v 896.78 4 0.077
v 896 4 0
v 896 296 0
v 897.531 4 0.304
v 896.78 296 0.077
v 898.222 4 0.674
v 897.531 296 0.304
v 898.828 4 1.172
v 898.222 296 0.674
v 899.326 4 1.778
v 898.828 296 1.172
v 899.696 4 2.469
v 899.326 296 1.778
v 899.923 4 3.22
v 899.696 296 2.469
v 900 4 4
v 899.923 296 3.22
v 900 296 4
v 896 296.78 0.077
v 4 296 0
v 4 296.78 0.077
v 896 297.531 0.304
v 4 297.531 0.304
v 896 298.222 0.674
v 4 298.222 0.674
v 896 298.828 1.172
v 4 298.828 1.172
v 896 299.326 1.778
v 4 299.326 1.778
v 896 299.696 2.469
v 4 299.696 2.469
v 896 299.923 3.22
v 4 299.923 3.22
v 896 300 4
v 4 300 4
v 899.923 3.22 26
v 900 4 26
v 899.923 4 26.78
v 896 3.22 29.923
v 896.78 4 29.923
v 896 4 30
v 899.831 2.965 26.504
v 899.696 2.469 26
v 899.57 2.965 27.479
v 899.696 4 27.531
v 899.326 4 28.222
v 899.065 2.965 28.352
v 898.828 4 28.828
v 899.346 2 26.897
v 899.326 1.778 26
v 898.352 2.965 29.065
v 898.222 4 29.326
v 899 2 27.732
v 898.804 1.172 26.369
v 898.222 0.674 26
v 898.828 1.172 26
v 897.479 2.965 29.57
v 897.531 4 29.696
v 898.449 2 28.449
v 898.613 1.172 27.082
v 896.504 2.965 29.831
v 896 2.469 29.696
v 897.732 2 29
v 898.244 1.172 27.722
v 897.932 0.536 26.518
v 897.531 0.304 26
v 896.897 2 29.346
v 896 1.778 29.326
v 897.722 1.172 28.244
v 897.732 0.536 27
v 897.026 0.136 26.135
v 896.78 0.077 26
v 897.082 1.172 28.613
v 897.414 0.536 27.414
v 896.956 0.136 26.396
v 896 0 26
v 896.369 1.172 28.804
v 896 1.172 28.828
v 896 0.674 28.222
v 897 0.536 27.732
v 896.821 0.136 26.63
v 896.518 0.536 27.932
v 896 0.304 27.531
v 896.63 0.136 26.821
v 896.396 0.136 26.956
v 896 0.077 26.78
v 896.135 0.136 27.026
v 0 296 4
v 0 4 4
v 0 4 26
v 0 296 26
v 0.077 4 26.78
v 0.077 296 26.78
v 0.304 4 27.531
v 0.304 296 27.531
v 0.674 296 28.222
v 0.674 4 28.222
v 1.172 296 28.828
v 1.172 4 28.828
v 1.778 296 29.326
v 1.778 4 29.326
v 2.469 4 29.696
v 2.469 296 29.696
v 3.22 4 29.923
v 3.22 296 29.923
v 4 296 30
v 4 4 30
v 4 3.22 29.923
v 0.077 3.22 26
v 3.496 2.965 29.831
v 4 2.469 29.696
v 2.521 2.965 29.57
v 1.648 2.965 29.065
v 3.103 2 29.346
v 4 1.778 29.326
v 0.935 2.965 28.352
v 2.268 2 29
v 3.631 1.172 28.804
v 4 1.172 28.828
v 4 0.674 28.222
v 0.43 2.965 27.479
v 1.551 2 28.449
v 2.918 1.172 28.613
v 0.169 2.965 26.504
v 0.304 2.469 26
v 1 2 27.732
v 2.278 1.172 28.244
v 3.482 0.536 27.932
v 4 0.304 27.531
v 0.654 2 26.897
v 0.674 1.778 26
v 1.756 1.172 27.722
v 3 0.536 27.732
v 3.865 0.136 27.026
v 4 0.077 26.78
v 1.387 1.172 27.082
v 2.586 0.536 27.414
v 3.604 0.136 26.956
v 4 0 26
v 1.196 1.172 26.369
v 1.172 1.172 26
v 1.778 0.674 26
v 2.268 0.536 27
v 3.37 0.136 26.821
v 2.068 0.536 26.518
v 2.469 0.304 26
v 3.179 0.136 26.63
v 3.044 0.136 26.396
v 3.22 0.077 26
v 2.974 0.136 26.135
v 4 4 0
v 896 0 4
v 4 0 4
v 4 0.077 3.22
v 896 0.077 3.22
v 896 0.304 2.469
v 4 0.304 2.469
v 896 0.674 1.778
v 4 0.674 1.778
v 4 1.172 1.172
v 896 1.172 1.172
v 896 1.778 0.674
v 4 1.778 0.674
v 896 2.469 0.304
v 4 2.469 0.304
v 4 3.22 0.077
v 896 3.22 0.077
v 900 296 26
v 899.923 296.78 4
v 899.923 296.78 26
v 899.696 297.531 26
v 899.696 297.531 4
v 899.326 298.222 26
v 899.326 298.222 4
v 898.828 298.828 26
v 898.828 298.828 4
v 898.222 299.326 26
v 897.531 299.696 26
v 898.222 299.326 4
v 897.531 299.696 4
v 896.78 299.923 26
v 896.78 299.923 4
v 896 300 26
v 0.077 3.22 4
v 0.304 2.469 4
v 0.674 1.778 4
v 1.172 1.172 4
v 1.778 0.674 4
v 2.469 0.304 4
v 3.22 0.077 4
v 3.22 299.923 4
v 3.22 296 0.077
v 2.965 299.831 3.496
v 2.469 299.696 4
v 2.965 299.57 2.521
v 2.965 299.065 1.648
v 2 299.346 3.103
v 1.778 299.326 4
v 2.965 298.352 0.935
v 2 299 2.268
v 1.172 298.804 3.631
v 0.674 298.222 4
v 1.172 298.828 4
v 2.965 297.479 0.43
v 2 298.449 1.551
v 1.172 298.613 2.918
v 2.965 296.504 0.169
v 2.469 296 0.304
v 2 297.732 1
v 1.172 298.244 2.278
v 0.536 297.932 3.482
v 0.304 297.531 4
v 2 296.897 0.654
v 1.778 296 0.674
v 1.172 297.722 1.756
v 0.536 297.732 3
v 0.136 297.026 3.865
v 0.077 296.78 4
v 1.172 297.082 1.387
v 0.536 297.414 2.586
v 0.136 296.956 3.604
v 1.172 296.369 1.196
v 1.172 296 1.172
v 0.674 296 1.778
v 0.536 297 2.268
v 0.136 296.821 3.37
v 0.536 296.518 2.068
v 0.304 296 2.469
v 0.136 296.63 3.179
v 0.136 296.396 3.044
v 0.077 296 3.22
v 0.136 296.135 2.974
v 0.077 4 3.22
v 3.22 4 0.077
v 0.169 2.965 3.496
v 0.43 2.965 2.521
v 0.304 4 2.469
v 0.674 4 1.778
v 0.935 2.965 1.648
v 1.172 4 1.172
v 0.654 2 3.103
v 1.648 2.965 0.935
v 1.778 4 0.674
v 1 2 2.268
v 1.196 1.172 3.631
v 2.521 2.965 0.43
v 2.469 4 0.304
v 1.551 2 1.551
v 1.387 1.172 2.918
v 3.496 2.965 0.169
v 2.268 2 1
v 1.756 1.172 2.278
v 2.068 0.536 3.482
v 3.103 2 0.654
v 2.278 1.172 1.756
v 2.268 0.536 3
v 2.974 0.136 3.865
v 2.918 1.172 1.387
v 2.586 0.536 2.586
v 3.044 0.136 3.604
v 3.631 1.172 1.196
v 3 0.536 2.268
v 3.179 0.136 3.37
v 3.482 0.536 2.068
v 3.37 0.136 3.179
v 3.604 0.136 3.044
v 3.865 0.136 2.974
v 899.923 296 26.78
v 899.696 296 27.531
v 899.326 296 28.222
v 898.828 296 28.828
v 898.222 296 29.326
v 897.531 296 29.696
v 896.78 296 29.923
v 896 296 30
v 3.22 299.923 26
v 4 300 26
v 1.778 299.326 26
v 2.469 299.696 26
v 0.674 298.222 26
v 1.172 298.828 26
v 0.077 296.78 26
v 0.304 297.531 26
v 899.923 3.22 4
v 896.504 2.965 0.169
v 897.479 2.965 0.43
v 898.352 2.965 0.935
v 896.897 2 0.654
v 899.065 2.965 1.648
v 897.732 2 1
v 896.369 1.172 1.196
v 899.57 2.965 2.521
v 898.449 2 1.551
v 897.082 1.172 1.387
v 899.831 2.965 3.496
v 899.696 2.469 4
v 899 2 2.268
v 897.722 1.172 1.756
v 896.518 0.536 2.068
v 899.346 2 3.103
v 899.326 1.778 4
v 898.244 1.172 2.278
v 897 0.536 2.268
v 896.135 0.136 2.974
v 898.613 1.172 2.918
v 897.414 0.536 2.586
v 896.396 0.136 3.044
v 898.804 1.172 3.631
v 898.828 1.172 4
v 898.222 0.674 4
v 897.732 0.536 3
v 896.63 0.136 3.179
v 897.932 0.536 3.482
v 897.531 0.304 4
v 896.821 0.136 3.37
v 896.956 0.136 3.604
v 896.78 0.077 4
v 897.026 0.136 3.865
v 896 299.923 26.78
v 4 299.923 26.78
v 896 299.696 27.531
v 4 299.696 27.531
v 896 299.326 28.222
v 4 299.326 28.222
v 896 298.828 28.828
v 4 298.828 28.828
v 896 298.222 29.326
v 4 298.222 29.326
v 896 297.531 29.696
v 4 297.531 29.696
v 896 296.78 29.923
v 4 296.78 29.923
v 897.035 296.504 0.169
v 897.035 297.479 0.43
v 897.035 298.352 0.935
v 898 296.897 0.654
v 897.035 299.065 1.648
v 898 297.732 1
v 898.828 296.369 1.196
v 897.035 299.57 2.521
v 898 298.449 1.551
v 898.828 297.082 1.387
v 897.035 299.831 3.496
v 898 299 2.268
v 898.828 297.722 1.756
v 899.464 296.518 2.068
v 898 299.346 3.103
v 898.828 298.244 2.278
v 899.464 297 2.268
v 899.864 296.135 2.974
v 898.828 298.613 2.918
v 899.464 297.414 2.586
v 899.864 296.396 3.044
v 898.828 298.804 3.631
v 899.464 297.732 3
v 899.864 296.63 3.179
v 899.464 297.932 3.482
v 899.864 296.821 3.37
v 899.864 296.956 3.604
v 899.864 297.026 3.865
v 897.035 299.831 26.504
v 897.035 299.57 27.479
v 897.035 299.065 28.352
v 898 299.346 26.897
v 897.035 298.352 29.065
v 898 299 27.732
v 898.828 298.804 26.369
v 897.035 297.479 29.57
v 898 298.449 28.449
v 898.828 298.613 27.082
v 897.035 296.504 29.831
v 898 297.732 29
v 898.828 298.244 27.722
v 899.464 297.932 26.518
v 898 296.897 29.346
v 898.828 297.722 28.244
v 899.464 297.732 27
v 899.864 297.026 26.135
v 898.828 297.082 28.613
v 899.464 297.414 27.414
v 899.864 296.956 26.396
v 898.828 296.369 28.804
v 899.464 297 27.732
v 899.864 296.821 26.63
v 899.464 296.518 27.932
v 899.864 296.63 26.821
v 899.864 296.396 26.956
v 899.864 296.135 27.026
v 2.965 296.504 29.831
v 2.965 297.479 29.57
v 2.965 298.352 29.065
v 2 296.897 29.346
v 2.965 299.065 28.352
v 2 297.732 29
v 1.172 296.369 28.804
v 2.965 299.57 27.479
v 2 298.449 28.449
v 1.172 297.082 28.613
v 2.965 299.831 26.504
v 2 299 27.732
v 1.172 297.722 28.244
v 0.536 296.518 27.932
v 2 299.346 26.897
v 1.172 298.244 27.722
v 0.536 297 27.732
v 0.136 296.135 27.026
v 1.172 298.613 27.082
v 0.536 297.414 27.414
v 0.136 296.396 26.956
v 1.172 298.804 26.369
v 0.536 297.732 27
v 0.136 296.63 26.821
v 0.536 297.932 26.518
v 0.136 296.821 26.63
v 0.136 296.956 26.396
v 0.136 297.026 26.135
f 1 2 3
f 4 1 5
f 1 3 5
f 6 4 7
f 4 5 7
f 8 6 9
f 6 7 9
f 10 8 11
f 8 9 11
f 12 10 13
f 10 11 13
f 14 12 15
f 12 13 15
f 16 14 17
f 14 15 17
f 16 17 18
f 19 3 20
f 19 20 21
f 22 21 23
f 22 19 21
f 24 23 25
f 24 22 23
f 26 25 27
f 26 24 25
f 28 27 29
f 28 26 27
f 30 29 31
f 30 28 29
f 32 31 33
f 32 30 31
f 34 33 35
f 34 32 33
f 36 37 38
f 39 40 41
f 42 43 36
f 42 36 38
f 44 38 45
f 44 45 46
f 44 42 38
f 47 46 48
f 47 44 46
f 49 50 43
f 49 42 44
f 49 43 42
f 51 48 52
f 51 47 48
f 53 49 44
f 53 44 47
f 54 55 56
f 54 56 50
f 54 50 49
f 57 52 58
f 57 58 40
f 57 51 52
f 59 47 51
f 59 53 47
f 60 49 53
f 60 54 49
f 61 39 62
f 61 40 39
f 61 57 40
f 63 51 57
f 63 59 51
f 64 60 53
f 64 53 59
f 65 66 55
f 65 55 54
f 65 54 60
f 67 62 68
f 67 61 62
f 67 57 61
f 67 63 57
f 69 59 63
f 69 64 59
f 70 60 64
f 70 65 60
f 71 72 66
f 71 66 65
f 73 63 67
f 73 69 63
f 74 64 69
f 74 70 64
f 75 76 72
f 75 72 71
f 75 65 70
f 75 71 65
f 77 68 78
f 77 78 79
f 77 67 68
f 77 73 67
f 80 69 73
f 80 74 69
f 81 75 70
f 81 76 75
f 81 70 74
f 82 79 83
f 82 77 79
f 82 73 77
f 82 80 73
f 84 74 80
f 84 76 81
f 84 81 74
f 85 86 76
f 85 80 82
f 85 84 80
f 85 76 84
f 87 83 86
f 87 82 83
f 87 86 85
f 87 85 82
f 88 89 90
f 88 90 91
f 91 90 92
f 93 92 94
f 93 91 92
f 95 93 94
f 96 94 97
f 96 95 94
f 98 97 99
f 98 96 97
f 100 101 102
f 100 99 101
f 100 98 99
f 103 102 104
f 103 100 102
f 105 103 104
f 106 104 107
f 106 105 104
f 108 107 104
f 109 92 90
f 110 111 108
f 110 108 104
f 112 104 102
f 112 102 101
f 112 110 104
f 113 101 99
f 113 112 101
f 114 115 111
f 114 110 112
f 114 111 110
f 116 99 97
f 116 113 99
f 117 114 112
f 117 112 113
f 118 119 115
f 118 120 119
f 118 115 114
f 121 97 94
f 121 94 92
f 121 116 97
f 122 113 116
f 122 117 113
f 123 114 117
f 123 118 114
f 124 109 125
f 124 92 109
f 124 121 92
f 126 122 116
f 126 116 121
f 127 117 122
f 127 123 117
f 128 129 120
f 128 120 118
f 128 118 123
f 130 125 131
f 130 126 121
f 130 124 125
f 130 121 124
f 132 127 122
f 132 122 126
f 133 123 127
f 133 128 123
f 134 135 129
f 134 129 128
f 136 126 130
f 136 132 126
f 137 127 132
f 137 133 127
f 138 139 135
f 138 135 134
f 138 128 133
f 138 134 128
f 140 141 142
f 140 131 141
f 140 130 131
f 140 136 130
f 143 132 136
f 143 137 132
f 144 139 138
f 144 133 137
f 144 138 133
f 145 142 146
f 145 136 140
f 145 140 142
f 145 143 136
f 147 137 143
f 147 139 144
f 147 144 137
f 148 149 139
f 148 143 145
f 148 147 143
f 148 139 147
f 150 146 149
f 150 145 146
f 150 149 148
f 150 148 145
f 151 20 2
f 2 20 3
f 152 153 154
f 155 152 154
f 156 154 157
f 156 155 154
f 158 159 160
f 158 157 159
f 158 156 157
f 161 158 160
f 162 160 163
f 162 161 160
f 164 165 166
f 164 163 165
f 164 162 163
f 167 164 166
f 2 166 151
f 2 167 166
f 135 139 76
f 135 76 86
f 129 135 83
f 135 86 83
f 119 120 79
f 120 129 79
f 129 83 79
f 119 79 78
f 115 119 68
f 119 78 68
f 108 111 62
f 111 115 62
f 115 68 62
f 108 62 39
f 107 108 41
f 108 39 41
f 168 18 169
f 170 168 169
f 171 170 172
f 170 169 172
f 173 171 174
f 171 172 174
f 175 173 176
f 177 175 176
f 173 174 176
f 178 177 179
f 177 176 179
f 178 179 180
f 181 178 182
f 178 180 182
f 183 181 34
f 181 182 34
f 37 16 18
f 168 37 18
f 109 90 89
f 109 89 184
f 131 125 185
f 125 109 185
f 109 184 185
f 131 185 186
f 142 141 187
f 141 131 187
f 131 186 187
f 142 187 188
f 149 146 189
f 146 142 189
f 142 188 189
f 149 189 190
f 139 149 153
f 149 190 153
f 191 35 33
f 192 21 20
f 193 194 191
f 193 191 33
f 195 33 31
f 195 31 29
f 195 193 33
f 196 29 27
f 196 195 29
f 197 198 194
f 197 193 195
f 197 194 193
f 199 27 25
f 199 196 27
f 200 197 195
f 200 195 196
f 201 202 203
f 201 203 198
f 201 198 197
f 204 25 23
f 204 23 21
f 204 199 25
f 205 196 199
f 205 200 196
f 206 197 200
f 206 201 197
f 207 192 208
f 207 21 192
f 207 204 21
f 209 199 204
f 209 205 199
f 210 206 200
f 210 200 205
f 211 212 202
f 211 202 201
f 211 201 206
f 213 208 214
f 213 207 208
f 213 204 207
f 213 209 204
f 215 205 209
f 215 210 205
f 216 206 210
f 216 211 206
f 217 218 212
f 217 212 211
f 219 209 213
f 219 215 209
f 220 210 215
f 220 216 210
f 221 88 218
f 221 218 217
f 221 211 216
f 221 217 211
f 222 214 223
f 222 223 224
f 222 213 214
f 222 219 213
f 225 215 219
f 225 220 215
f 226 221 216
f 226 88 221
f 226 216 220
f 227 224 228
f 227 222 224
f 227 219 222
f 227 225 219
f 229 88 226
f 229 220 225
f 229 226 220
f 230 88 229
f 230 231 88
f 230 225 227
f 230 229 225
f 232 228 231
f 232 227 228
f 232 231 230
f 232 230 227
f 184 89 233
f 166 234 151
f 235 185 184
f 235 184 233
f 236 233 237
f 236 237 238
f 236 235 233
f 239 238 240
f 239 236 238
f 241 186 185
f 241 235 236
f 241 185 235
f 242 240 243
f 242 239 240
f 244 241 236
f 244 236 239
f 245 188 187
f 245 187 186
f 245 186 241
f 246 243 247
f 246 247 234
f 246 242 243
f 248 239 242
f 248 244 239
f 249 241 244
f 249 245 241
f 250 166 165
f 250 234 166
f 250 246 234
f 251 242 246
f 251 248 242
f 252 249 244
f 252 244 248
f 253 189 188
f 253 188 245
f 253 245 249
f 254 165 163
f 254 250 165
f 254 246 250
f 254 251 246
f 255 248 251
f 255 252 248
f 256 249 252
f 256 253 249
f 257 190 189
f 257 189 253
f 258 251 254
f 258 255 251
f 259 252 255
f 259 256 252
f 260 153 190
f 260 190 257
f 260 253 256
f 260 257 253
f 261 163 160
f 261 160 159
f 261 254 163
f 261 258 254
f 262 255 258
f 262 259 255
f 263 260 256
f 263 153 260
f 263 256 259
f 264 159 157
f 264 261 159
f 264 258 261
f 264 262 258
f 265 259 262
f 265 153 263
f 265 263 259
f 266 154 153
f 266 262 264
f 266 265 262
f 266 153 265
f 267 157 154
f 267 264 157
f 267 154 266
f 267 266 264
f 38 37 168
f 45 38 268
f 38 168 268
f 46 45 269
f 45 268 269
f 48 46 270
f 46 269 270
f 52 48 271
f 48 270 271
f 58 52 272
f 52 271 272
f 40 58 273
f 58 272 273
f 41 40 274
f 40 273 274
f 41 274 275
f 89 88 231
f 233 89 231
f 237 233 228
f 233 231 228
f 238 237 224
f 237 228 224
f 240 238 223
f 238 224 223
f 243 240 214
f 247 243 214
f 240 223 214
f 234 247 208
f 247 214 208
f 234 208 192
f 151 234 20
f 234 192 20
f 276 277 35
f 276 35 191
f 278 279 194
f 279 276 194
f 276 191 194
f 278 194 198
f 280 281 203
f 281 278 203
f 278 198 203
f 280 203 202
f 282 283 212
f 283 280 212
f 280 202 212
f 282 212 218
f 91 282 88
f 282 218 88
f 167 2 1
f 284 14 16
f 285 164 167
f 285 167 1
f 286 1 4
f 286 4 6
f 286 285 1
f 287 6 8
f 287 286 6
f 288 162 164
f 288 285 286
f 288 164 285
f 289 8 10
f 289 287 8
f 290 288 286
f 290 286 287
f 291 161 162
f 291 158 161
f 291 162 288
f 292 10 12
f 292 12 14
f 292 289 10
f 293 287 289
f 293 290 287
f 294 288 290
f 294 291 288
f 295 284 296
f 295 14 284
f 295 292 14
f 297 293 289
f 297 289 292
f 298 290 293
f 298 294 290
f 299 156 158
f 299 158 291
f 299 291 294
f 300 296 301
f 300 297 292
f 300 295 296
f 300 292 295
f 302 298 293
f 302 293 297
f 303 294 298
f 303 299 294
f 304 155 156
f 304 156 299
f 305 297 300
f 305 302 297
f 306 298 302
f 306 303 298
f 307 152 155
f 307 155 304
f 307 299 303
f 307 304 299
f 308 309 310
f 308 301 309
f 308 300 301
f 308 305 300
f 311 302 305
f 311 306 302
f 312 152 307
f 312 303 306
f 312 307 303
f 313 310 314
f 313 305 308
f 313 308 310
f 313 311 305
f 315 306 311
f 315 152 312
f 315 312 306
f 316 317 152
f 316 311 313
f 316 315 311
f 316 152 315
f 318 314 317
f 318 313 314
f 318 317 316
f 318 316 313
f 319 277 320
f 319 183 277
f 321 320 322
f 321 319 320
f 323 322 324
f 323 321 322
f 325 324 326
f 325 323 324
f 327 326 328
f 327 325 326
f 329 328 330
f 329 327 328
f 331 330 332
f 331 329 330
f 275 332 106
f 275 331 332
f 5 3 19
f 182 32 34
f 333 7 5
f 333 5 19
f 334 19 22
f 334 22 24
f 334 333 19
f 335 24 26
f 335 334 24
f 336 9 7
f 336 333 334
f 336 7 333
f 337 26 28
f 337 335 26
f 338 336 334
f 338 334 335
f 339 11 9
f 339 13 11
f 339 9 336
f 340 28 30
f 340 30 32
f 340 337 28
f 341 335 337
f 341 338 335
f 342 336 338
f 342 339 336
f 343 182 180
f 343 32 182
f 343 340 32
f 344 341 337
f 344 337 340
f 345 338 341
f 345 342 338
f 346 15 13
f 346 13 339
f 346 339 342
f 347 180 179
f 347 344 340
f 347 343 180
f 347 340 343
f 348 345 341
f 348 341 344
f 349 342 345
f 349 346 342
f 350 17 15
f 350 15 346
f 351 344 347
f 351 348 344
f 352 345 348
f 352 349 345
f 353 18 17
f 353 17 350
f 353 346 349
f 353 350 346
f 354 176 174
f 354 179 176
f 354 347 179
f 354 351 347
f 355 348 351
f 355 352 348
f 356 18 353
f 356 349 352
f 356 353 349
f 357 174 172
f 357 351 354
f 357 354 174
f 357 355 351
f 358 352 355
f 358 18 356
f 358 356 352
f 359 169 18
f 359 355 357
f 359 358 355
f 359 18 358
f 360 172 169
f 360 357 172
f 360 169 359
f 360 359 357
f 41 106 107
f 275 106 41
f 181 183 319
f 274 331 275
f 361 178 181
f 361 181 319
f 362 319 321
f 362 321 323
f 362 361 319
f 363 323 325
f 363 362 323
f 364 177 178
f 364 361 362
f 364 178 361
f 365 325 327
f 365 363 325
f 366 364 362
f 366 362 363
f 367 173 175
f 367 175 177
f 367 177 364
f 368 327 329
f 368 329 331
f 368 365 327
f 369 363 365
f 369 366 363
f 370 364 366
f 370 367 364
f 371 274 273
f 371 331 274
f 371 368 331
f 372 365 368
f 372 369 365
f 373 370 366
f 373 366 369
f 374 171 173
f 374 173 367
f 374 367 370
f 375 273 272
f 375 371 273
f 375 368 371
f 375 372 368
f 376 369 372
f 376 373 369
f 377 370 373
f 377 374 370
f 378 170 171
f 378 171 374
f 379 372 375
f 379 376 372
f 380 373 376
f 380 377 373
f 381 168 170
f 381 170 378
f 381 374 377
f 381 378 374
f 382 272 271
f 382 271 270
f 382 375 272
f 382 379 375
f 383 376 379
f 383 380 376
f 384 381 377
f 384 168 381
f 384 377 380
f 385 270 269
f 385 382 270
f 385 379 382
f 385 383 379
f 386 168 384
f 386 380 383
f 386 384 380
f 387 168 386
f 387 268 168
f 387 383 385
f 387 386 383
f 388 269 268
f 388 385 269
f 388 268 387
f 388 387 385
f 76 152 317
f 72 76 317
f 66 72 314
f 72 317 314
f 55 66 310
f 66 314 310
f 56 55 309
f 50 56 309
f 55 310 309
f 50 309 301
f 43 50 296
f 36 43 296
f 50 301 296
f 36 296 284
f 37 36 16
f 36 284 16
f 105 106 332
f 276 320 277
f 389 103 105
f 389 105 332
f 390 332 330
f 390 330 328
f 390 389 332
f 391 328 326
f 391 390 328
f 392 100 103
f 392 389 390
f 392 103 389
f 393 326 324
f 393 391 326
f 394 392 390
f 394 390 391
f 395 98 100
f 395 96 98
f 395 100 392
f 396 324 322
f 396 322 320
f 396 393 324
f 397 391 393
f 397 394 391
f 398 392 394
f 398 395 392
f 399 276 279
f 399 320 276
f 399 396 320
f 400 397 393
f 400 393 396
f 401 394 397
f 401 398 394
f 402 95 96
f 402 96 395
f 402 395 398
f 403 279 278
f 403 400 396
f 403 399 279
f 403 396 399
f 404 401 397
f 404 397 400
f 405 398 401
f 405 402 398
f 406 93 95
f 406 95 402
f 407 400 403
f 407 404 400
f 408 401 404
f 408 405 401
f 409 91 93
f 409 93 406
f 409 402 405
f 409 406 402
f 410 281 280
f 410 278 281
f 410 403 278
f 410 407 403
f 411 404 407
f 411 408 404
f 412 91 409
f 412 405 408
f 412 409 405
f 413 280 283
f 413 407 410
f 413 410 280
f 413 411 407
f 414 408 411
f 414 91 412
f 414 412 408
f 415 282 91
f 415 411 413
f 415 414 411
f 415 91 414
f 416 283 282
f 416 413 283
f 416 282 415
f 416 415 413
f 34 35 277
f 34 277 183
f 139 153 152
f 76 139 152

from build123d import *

# Parameters (mm, degrees)
SKETCH1_W           = 900
SKETCH1_H           = 300
BOSS_EXTRUDE1_DEPTH = 30
FILLET1_R           = 4
FILLET2_R           = 4
FILLET3_R           = 4


with BuildPart() as part:
    # Sketch1 → Boss-Extrude1 (new body)
    with BuildSketch(Plane.XY):
        with Locations((450, 150)):
            Rectangle(SKETCH1_W, SKETCH1_H)
    extrude(amount=BOSS_EXTRUDE1_DEPTH)

    # Fillet1
    fillet1_edges = [part.edges().sort_by_distance(p)[0] for p in [
        (900, 150, 30),
        (450, 300, 30),
        (0, 150, 30),
        (450, 0, 30),
    ]]
    fillet(fillet1_edges, radius=FILLET1_R)

    # Fillet2
    fillet2_edges = [part.edges().sort_by_distance(p)[0] for p in [
        (450, 300, 0),
        (900, 150, 0),
        (450, 0, 0),
        (0, 150, 0),
    ]]
    fillet(fillet2_edges, radius=FILLET2_R)

    # Fillet3
    # the kernel refuses this fillet: 4 mm, written as the material it takes off along each edge
    with BuildSketch(Plane(origin=(896, 4, 26), x_dir=(1, 0, 0), z_dir=(0, -1, 0))) as fillet3_piece_1_section:
        Polygon((0, 0), (FILLET3_R, 0), (FILLET3_R, FILLET3_R), (0, FILLET3_R), align=None)
    fillet3_piece_1 = extrude(amount=FILLET3_R, mode=Mode.PRIVATE)
    fillet3_piece_1 = fillet3_piece_1 - Plane(origin=(896, 4, 26), x_dir=(-0.7071067811865475, 0, -0.7071067811865475), z_dir=(0, -1, 0)) * Sphere(FILLET3_R, mode=Mode.PRIVATE)
    add(fillet3_piece_1, mode=Mode.SUBTRACT)
    with BuildSketch(Plane(origin=(4, 4, 26), x_dir=(-1, 0, 0), z_dir=(0, -1, 0))) as fillet3_piece_2_section:
        Polygon((0, 0), (FILLET3_R, 0), (FILLET3_R, -FILLET3_R), (0, -FILLET3_R), align=None)
    fillet3_piece_2 = extrude(amount=FILLET3_R, mode=Mode.PRIVATE)
    fillet3_piece_2 = fillet3_piece_2 - Plane(origin=(4, 4, 26), x_dir=(0.7071067811865475, 0, -0.7071067811865475), z_dir=(0, -1, 0)) * Sphere(FILLET3_R, mode=Mode.PRIVATE)
    add(fillet3_piece_2, mode=Mode.SUBTRACT)
    with BuildSketch(Plane(origin=(896, 296, 26), x_dir=(0, 1, 0), z_dir=(1, 0, 0))) as fillet3_piece_3_section:
        Polygon((0, 0), (FILLET3_R, 0), (FILLET3_R, FILLET3_R), (0, FILLET3_R), align=None)
    fillet3_piece_3 = extrude(amount=FILLET3_R, mode=Mode.PRIVATE)
    fillet3_piece_3 = fillet3_piece_3 - Plane(origin=(896, 296, 26), x_dir=(0, -0.7071067811865475, -0.7071067811865475), z_dir=(1, 0, 0)) * Sphere(FILLET3_R, mode=Mode.PRIVATE)
    add(fillet3_piece_3, mode=Mode.SUBTRACT)
    with BuildSketch(Plane(origin=(4, 296, 26), x_dir=(0, 1, 0), z_dir=(-1, 0, 0))) as fillet3_piece_4_section:
        Polygon((0, 0), (FILLET3_R, 0), (FILLET3_R, -FILLET3_R), (0, -FILLET3_R), align=None)
    fillet3_piece_4 = extrude(amount=FILLET3_R, mode=Mode.PRIVATE)
    fillet3_piece_4 = fillet3_piece_4 - Plane(origin=(4, 296, 26), x_dir=(0, -0.7071067811865475, -0.7071067811865475), z_dir=(-1, 0, 0)) * Sphere(FILLET3_R, mode=Mode.PRIVATE)
    add(fillet3_piece_4, mode=Mode.SUBTRACT)
    with BuildSketch(Plane(origin=(4, 296, 4), x_dir=(0, 1, 0), z_dir=(-1, 0, 0))) as fillet3_piece_5_section:
        Polygon((0, 0), (FILLET3_R, 0), (FILLET3_R, FILLET3_R), (0, FILLET3_R), align=None)
    fillet3_piece_5 = extrude(amount=FILLET3_R, mode=Mode.PRIVATE)
    fillet3_piece_5 = fillet3_piece_5 - Plane(origin=(4, 296, 4), x_dir=(0, -0.7071067811865475, 0.7071067811865475), z_dir=(-1, 0, 0)) * Sphere(FILLET3_R, mode=Mode.PRIVATE)
    add(fillet3_piece_5, mode=Mode.SUBTRACT)
    with BuildSketch(Plane(origin=(896, 296, 4), x_dir=(0, 1, 0), z_dir=(1, 0, 0))) as fillet3_piece_6_section:
        Polygon((0, 0), (FILLET3_R, 0), (FILLET3_R, -FILLET3_R), (0, -FILLET3_R), align=None)
    fillet3_piece_6 = extrude(amount=FILLET3_R, mode=Mode.PRIVATE)
    fillet3_piece_6 = fillet3_piece_6 - Plane(origin=(896, 296, 4), x_dir=(0, -0.7071067811865475, 0.7071067811865475), z_dir=(1, 0, 0)) * Sphere(FILLET3_R, mode=Mode.PRIVATE)
    add(fillet3_piece_6, mode=Mode.SUBTRACT)
    with BuildSketch(Plane(origin=(4, 4, 4), x_dir=(-1, 0, 0), z_dir=(0, -1, 0))) as fillet3_piece_7_section:
        Polygon((0, 0), (FILLET3_R, 0), (FILLET3_R, FILLET3_R), (0, FILLET3_R), align=None)
    fillet3_piece_7 = extrude(amount=FILLET3_R, mode=Mode.PRIVATE)
    fillet3_piece_7 = fillet3_piece_7 - Plane(origin=(4, 4, 4), x_dir=(0.7071067811865475, 0, 0.7071067811865475), z_dir=(0, -1, 0)) * Sphere(FILLET3_R, mode=Mode.PRIVATE)
    add(fillet3_piece_7, mode=Mode.SUBTRACT)
    with BuildSketch(Plane(origin=(896, 4, 4), x_dir=(1, 0, 0), z_dir=(0, -1, 0))) as fillet3_piece_8_section:
        Polygon((0, 0), (FILLET3_R, 0), (FILLET3_R, -FILLET3_R), (0, -FILLET3_R), align=None)
    fillet3_piece_8 = extrude(amount=FILLET3_R, mode=Mode.PRIVATE)
    fillet3_piece_8 = fillet3_piece_8 - Plane(origin=(896, 4, 4), x_dir=(-0.7071067811865475, 0, 0.7071067811865475), z_dir=(0, -1, 0)) * Sphere(FILLET3_R, mode=Mode.PRIVATE)
    add(fillet3_piece_8, mode=Mode.SUBTRACT)
    with BuildSketch(Plane(origin=(0, 300, 4), x_dir=(0, -1, 0), z_dir=(0, 0, 1)), Plane(origin=(0, 0, 4), x_dir=(1, 0, 0), z_dir=(0, 0, 1))) as fillet3_piece_9:
        with BuildLine():
            CenterArc((FILLET3_R, FILLET3_R), FILLET3_R, 180, 90)
            Line((0, FILLET3_R), (0, 0))
            Line((0, 0), (FILLET3_R, 0))
        make_face()
    extrude(amount=22, mode=Mode.SUBTRACT)
    with BuildSketch(Plane(origin=(900, 300, 4), x_dir=(0, -1, 0), z_dir=(0, 0, 1)), Plane(origin=(900, 0, 4), x_dir=(-1, 0, 0), z_dir=(0, 0, 1))) as fillet3_piece_10:
        with BuildLine():
            CenterArc((FILLET3_R, -FILLET3_R), FILLET3_R, 90, 90)
            Line((0, -FILLET3_R), (0, 0))
            Line((0, 0), (FILLET3_R, 0))
        make_face()
    extrude(amount=22, mode=Mode.SUBTRACT)


solid = part.part
